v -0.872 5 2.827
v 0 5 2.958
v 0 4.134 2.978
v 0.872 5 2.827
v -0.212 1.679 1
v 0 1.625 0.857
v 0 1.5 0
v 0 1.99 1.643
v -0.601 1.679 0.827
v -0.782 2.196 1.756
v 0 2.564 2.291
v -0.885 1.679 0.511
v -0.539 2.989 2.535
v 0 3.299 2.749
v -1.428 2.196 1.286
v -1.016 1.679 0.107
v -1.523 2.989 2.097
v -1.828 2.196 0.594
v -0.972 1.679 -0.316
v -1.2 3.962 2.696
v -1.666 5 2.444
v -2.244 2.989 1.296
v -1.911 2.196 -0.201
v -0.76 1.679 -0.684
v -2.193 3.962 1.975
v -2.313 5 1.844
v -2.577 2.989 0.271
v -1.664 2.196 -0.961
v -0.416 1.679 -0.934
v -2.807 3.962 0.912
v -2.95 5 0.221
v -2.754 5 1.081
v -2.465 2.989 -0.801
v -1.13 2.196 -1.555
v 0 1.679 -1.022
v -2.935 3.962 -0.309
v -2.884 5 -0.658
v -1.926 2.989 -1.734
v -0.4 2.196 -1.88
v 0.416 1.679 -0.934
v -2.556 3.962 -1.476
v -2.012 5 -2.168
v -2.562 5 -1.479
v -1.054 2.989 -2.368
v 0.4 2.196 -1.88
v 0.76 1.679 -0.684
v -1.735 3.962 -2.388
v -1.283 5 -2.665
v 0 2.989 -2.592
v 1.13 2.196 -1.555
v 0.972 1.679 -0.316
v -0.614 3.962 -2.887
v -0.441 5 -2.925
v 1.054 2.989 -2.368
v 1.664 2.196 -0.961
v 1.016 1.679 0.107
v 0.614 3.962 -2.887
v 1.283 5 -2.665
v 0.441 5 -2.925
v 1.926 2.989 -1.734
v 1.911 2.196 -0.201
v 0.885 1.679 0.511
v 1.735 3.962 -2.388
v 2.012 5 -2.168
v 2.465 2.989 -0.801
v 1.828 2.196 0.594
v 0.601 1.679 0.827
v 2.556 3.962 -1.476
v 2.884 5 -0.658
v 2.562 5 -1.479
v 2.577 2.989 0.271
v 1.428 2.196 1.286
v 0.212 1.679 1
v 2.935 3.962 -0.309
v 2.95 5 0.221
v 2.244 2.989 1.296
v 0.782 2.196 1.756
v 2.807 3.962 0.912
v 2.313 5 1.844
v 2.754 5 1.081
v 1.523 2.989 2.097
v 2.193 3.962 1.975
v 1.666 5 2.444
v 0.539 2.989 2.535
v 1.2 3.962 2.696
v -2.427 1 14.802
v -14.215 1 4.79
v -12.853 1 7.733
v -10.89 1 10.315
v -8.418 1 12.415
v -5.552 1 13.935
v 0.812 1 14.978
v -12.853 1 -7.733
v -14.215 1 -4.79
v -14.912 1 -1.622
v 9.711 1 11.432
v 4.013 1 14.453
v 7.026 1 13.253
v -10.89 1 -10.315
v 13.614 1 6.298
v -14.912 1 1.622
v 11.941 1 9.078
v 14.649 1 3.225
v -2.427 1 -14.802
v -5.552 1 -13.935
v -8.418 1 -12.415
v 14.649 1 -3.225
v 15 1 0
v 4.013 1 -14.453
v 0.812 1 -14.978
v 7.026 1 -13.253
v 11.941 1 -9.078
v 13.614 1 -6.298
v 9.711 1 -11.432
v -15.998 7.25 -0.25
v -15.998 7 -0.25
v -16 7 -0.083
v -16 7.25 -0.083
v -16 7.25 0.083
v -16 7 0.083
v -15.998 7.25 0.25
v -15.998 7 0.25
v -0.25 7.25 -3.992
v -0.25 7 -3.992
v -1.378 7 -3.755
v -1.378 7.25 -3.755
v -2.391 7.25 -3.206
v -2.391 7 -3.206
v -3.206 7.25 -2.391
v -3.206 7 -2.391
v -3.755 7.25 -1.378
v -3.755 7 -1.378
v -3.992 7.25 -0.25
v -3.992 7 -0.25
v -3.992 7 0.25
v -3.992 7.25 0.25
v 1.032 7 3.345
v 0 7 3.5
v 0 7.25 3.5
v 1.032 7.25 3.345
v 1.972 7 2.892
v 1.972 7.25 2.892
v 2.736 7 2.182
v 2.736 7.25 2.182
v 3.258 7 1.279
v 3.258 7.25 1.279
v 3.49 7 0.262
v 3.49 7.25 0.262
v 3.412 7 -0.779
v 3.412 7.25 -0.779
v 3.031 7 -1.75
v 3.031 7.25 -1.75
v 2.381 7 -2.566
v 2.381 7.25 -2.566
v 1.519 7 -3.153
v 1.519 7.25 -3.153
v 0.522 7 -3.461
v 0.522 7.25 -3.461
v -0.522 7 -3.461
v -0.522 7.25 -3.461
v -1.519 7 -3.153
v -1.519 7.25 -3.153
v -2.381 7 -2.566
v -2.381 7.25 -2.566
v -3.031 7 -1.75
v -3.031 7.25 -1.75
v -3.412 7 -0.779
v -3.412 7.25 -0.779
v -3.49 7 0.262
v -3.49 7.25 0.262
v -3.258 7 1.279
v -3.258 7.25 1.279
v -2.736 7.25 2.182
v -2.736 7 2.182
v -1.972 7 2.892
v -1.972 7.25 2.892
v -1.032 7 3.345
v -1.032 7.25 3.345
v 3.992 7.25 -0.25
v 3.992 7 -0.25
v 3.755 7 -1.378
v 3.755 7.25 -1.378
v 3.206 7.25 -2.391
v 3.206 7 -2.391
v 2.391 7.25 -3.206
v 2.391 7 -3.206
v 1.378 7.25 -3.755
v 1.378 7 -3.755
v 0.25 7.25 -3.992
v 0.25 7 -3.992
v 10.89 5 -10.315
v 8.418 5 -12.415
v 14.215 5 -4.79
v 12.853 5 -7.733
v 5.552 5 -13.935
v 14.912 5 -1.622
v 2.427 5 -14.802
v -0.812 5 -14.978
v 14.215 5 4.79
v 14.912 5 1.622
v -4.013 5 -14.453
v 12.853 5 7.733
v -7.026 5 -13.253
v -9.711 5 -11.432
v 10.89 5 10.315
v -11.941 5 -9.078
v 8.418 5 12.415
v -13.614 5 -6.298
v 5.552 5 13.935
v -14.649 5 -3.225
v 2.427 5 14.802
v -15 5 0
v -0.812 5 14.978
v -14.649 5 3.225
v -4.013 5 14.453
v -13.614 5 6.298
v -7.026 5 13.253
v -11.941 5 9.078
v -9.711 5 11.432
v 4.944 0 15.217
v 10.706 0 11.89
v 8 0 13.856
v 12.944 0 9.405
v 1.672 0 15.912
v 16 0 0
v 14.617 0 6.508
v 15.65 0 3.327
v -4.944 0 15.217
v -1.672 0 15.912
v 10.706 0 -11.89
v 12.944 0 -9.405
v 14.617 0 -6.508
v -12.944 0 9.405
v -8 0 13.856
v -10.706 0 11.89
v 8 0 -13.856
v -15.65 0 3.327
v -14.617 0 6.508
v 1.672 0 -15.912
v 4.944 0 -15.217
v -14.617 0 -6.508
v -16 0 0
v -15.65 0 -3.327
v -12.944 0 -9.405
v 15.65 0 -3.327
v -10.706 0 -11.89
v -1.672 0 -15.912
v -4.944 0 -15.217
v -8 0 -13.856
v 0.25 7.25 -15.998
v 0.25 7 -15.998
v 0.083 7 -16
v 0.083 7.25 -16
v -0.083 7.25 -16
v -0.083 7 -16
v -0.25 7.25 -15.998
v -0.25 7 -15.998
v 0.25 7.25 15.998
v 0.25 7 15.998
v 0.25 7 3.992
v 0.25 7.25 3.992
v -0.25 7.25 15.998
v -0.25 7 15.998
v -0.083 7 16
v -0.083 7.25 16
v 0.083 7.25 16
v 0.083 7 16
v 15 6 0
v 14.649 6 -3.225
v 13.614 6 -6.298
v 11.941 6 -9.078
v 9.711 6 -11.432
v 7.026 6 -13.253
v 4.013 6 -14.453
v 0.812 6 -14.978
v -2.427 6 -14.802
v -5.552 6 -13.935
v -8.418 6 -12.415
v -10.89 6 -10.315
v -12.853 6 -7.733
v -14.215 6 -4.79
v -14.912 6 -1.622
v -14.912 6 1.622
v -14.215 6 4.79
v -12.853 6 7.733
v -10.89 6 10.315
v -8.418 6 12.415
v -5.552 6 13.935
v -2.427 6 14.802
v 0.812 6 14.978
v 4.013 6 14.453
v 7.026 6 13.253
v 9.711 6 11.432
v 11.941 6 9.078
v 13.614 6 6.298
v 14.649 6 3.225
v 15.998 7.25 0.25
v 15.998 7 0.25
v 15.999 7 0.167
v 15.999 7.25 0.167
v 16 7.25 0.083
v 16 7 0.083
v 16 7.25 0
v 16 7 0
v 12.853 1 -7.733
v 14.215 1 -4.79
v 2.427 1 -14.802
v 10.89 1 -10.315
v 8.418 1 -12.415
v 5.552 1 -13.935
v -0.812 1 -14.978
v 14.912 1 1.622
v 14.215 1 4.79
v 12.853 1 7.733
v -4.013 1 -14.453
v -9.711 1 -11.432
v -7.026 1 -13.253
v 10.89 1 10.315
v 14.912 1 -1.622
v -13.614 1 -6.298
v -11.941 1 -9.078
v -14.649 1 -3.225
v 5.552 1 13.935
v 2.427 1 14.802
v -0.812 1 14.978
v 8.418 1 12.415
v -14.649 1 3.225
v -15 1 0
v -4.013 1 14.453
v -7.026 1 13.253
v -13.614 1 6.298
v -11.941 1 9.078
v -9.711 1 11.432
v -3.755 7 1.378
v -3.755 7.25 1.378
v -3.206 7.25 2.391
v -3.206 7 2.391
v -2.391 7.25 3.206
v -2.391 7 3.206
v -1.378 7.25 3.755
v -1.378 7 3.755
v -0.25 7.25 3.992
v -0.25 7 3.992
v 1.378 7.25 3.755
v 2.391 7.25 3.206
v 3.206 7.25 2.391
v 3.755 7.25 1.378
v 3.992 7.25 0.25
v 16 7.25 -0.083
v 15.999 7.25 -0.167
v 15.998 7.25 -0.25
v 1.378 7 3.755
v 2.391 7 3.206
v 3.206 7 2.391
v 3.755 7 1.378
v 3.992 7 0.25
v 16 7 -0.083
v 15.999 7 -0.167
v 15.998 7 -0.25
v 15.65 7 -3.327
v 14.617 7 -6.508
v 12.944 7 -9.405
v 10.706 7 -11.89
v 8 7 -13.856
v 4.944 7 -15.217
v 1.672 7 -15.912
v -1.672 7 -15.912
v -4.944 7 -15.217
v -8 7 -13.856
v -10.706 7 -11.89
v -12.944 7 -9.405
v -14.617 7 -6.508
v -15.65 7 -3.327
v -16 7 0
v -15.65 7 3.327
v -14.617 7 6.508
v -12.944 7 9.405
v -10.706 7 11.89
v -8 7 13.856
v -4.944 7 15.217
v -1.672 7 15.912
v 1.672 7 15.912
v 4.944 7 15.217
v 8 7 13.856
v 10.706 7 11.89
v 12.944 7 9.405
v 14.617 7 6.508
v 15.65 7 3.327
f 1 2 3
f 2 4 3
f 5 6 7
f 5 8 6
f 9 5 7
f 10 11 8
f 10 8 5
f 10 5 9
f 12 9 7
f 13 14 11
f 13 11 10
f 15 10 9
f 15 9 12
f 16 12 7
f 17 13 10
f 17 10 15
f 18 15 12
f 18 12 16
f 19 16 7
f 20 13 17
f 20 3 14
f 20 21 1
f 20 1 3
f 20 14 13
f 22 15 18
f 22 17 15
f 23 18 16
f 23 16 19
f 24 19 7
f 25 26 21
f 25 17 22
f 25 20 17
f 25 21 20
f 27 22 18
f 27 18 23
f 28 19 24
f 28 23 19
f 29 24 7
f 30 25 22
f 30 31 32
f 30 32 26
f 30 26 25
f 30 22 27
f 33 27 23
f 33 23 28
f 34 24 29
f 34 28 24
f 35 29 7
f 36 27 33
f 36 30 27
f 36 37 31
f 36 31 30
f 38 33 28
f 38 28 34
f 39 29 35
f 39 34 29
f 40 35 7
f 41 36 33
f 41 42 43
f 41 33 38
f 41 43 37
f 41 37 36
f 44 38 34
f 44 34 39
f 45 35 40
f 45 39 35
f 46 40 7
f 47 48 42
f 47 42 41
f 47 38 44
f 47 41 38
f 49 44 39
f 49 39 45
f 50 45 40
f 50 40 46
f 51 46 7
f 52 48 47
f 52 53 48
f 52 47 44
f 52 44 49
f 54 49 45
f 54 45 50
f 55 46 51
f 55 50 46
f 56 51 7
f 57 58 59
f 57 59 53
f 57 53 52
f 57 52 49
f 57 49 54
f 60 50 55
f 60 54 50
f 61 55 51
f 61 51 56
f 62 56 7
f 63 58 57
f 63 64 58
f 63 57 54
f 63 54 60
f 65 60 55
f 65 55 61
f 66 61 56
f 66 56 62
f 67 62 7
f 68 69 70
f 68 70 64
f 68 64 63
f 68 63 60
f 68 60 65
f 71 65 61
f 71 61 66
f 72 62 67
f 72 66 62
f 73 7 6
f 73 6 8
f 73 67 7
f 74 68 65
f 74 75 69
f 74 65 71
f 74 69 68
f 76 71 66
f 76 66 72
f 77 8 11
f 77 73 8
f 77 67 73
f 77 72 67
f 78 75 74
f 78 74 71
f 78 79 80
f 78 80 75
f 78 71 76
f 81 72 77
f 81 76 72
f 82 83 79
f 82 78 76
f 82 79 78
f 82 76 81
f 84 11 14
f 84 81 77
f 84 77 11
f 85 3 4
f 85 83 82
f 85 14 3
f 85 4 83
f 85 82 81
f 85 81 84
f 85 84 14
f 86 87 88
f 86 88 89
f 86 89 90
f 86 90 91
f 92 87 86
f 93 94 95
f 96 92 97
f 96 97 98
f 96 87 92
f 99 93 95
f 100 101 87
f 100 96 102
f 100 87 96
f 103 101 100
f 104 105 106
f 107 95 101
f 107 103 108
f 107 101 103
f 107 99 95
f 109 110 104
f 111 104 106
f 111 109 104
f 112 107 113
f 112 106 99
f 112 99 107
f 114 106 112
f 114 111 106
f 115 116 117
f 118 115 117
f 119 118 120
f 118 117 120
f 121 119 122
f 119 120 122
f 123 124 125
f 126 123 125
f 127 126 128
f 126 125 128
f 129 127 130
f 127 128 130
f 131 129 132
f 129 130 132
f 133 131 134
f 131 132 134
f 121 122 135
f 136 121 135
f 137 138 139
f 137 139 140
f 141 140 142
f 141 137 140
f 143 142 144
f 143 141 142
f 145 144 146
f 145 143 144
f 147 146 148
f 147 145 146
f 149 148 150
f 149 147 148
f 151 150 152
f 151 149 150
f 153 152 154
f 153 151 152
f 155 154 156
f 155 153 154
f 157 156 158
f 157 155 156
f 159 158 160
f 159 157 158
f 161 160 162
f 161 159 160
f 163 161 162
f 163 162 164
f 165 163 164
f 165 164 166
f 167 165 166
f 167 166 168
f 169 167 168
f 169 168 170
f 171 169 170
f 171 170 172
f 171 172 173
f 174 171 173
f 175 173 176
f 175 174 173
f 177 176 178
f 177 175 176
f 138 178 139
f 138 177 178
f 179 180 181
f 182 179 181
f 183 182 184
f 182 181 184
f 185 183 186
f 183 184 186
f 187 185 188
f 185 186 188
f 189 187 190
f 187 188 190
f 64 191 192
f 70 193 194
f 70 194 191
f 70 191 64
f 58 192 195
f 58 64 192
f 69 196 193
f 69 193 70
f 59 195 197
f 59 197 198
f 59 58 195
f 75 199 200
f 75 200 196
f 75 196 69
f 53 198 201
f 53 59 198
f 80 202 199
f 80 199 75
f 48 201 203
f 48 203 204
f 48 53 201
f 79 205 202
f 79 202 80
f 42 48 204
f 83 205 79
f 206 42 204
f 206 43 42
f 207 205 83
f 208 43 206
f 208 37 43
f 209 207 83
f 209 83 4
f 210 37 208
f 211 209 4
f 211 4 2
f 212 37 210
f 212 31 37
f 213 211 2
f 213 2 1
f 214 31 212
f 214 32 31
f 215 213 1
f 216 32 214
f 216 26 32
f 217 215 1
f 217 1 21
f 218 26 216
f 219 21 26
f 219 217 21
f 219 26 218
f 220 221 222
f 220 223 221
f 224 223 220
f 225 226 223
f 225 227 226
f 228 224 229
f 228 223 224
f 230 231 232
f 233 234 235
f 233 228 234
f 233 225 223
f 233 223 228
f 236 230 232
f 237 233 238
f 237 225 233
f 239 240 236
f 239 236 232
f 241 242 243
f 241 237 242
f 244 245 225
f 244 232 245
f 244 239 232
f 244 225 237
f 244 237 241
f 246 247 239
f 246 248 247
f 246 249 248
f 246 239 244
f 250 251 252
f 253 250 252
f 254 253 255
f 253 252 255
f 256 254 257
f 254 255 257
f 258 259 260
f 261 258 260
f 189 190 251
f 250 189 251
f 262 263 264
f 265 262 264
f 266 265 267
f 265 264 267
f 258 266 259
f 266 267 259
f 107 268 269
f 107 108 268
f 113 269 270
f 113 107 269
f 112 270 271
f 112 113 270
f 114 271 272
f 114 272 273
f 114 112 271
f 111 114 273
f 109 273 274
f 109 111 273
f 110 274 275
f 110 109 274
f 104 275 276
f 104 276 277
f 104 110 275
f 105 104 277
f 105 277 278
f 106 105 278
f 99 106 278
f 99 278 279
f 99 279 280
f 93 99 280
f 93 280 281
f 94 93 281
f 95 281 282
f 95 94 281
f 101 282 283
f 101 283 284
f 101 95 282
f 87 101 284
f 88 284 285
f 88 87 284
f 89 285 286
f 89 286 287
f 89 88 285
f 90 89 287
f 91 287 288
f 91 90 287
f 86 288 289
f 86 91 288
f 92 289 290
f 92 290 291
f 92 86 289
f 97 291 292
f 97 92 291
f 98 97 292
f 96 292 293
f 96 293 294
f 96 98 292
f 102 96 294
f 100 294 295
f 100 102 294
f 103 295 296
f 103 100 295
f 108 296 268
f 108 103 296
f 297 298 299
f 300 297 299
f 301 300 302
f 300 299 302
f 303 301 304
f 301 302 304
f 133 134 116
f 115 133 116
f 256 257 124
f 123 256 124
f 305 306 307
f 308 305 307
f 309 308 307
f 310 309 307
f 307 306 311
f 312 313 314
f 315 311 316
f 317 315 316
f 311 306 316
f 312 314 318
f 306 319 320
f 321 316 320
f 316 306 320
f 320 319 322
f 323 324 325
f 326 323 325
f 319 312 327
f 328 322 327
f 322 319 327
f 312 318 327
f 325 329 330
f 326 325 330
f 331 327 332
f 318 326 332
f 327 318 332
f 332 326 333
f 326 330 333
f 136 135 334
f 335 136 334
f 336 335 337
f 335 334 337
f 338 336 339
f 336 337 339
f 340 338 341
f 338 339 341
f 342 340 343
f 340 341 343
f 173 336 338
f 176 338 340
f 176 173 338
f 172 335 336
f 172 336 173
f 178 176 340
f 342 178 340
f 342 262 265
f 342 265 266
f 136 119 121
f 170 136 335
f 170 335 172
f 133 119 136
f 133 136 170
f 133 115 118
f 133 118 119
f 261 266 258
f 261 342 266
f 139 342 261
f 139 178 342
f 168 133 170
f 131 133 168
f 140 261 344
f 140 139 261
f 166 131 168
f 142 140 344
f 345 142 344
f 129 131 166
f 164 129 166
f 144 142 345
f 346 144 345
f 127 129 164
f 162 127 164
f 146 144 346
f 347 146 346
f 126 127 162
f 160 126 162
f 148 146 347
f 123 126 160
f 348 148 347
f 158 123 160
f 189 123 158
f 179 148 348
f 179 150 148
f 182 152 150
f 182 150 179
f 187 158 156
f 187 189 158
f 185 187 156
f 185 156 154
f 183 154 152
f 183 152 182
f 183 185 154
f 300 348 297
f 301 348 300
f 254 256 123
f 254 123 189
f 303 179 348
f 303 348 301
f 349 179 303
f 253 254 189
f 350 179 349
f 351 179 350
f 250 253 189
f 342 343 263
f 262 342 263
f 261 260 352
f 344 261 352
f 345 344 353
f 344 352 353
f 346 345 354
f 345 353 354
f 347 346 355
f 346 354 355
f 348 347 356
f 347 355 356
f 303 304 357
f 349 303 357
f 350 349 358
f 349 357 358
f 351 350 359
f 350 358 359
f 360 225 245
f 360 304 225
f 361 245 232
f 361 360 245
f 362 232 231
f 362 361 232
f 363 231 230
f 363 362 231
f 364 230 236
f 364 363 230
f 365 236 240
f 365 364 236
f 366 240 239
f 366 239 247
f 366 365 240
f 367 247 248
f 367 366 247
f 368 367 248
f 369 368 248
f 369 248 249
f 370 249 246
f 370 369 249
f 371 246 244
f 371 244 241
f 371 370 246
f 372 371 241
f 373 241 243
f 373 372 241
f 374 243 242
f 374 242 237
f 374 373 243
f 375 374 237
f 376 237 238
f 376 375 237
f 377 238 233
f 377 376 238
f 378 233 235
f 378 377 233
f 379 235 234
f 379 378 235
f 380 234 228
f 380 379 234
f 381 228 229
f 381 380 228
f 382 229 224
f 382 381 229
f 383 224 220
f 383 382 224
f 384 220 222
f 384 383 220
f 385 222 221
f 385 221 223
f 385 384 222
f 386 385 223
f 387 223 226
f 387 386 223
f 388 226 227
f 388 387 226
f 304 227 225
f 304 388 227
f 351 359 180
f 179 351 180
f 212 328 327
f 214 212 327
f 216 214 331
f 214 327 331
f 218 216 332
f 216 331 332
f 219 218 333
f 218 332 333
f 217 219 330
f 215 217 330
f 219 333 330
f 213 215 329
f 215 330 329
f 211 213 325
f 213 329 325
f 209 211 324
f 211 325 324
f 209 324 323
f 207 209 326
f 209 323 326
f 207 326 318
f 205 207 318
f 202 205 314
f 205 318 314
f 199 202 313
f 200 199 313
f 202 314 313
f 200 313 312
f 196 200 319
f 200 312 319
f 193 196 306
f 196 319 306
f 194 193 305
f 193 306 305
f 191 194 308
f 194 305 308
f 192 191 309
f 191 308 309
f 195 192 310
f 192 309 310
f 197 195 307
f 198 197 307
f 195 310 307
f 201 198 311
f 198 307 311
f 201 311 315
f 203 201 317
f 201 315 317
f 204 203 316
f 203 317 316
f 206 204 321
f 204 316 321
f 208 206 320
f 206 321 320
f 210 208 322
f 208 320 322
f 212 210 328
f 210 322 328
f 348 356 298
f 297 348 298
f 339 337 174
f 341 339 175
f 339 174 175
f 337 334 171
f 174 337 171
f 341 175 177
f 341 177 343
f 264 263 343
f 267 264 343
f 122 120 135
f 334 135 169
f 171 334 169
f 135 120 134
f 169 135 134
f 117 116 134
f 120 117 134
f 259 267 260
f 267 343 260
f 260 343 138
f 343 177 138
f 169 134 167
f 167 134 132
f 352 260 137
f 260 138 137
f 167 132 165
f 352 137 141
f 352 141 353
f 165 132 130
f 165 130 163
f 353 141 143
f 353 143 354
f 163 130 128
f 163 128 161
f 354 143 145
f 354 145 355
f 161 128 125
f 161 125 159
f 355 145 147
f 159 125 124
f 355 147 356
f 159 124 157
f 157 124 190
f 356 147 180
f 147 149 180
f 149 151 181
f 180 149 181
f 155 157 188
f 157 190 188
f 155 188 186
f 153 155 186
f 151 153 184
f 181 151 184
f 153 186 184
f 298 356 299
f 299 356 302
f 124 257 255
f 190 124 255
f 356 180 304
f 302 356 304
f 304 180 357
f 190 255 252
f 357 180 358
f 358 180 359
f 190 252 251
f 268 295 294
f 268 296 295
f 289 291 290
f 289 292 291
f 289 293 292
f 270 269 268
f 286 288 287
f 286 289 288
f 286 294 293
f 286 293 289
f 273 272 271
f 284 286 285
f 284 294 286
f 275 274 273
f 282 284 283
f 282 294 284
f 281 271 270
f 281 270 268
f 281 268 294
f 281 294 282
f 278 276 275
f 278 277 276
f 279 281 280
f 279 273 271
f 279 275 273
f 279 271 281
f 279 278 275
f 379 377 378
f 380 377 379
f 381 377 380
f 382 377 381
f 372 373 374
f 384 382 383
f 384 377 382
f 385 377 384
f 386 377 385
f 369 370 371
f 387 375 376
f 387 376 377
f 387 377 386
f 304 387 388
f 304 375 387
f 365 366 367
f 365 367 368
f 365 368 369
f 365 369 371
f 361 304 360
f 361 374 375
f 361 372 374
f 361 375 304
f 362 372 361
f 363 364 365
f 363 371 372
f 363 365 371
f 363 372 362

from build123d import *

# Parameters (mm, degrees)
SKETCH3_R           = 15
BOSS_EXTRUDE1_DEPTH = 4
SKETCH4_R           = 4
SKETCH4_R_2         = 3.5
BOSS_EXTRUDE2_DEPTH = 0.25


with BuildPart() as part:
    # Sketch2 → Revolve1 (revolve)
    with BuildSketch(Plane.XY, mode=Mode.PRIVATE) as revolve1_sk:
        Polygon((0, 0), (-16, 0), (-16, 7), (0, 7), (0, 6), (-15, 6), (-15, 1), (0, 1), align=None)
    revolve(revolve1_sk.sketch.rotate(Axis((0, 0, 0), (0, 1, 0)), 180), axis=Axis((0, 0, 0), (0, 1, 0)))


with BuildPart() as body_2:
    # Sketch3 → Boss-Extrude1 (new body)
    with BuildSketch(Plane(origin=(0, 1, 0), x_dir=(1, 0, 0), z_dir=(0, 1, 0))):
        with Locations(Location((0, 0, 0), (0, 0, 180))):
            Circle(SKETCH3_R)
    extrude(amount=BOSS_EXTRUDE1_DEPTH)

    # Sketch5 → Cut-Revolve1 (revolve, cut)
    with BuildSketch(Plane(origin=(0, 0, 0), x_dir=(0, 0, -1), z_dir=(1, 0, 0))):
        with BuildLine():
            Line((0, 7.5), (0, 1.5))
            ThreePointArc((0, 1.5), (-3, 4.5), (0, 7.5))
        make_face()
    revolve(axis=Axis((0, 7.5, 0), (0, -1, 0)), mode=Mode.SUBTRACT)


with BuildPart() as body_3:
    # Sketch4 → Boss-Extrude2 (new body)
    # profile 1 of 5: a face of its own
    with BuildSketch(Plane(origin=(0, 7, 0), x_dir=(1, 0, 0), z_dir=(0, 1, 0))):
        Circle(SKETCH4_R)
        with Locations(Location((0, 0, 0), (0, 0, 270))):
            Circle(SKETCH4_R_2, mode=Mode.SUBTRACT)
    # profile 2 of 5: a face of its own
    with BuildSketch(Plane(origin=(0, 7, 0), x_dir=(1, 0, 0), z_dir=(0, 1, 0))):
        with BuildLine():
            Line((3.992179856, -0.25), (15.998046756, -0.25))
            ThreePointArc((15.998046756, -0.25), (15.999511681, -0.125003815), (16, 0))
            ThreePointArc((16, 0), (15.999511681, 0.125003815), (15.998046756, 0.25))
            Line((15.998046756, 0.25), (3.992179856, 0.25))
            ThreePointArc((3.992179856, 0.25), (3.998044486, 0.12506114), (4, 0))
            ThreePointArc((4, 0), (3.998044486, -0.12506114), (3.992179856, -0.25))
        make_face()
    # profile 3 of 5: a face of its own
    with BuildSketch(Plane(origin=(0, 7, 0), x_dir=(1, 0, 0), z_dir=(0, 1, 0))):
        with BuildLine():
            ThreePointArc((0.25, 15.998046756), (0, 16), (-0.25, 15.998046756))
            Line((-0.25, 15.998046756), (-0.25, 3.992179856))
            ThreePointArc((-0.25, 3.992179856), (0, 4), (0.25, 3.992179856))
            Line((0.25, 3.992179856), (0.25, 15.998046756))
        make_face()
    # profile 4 of 5: a face of its own
    with BuildSketch(Plane(origin=(0, 7, 0), x_dir=(1, 0, 0), z_dir=(0, 1, 0))):
        with BuildLine():
            ThreePointArc((-15.998046756, 0.25), (-16, 0), (-15.998046756, -0.25))
            Line((-15.998046756, -0.25), (-3.992179856, -0.25))
            ThreePointArc((-3.992179856, -0.25), (-4, 0), (-3.992179856, 0.25))
            Line((-3.992179856, 0.25), (-15.998046756, 0.25))
        make_face()
    # profile 5 of 5: a face of its own
    with BuildSketch(Plane(origin=(0, 7, 0), x_dir=(1, 0, 0), z_dir=(0, 1, 0))):
        with BuildLine():
            Line((-0.25, -3.992179856), (-0.25, -15.998046756))
            ThreePointArc((-0.25, -15.998046756), (0, -16), (0.25, -15.998046756))
            Line((0.25, -15.998046756), (0.25, -3.992179856))
            ThreePointArc((0.25, -3.992179856), (0, -4), (-0.25, -3.992179856))
        make_face()
    extrude(amount=BOSS_EXTRUDE2_DEPTH)


solid = Compound([part.part, body_2.part, body_3.part])
